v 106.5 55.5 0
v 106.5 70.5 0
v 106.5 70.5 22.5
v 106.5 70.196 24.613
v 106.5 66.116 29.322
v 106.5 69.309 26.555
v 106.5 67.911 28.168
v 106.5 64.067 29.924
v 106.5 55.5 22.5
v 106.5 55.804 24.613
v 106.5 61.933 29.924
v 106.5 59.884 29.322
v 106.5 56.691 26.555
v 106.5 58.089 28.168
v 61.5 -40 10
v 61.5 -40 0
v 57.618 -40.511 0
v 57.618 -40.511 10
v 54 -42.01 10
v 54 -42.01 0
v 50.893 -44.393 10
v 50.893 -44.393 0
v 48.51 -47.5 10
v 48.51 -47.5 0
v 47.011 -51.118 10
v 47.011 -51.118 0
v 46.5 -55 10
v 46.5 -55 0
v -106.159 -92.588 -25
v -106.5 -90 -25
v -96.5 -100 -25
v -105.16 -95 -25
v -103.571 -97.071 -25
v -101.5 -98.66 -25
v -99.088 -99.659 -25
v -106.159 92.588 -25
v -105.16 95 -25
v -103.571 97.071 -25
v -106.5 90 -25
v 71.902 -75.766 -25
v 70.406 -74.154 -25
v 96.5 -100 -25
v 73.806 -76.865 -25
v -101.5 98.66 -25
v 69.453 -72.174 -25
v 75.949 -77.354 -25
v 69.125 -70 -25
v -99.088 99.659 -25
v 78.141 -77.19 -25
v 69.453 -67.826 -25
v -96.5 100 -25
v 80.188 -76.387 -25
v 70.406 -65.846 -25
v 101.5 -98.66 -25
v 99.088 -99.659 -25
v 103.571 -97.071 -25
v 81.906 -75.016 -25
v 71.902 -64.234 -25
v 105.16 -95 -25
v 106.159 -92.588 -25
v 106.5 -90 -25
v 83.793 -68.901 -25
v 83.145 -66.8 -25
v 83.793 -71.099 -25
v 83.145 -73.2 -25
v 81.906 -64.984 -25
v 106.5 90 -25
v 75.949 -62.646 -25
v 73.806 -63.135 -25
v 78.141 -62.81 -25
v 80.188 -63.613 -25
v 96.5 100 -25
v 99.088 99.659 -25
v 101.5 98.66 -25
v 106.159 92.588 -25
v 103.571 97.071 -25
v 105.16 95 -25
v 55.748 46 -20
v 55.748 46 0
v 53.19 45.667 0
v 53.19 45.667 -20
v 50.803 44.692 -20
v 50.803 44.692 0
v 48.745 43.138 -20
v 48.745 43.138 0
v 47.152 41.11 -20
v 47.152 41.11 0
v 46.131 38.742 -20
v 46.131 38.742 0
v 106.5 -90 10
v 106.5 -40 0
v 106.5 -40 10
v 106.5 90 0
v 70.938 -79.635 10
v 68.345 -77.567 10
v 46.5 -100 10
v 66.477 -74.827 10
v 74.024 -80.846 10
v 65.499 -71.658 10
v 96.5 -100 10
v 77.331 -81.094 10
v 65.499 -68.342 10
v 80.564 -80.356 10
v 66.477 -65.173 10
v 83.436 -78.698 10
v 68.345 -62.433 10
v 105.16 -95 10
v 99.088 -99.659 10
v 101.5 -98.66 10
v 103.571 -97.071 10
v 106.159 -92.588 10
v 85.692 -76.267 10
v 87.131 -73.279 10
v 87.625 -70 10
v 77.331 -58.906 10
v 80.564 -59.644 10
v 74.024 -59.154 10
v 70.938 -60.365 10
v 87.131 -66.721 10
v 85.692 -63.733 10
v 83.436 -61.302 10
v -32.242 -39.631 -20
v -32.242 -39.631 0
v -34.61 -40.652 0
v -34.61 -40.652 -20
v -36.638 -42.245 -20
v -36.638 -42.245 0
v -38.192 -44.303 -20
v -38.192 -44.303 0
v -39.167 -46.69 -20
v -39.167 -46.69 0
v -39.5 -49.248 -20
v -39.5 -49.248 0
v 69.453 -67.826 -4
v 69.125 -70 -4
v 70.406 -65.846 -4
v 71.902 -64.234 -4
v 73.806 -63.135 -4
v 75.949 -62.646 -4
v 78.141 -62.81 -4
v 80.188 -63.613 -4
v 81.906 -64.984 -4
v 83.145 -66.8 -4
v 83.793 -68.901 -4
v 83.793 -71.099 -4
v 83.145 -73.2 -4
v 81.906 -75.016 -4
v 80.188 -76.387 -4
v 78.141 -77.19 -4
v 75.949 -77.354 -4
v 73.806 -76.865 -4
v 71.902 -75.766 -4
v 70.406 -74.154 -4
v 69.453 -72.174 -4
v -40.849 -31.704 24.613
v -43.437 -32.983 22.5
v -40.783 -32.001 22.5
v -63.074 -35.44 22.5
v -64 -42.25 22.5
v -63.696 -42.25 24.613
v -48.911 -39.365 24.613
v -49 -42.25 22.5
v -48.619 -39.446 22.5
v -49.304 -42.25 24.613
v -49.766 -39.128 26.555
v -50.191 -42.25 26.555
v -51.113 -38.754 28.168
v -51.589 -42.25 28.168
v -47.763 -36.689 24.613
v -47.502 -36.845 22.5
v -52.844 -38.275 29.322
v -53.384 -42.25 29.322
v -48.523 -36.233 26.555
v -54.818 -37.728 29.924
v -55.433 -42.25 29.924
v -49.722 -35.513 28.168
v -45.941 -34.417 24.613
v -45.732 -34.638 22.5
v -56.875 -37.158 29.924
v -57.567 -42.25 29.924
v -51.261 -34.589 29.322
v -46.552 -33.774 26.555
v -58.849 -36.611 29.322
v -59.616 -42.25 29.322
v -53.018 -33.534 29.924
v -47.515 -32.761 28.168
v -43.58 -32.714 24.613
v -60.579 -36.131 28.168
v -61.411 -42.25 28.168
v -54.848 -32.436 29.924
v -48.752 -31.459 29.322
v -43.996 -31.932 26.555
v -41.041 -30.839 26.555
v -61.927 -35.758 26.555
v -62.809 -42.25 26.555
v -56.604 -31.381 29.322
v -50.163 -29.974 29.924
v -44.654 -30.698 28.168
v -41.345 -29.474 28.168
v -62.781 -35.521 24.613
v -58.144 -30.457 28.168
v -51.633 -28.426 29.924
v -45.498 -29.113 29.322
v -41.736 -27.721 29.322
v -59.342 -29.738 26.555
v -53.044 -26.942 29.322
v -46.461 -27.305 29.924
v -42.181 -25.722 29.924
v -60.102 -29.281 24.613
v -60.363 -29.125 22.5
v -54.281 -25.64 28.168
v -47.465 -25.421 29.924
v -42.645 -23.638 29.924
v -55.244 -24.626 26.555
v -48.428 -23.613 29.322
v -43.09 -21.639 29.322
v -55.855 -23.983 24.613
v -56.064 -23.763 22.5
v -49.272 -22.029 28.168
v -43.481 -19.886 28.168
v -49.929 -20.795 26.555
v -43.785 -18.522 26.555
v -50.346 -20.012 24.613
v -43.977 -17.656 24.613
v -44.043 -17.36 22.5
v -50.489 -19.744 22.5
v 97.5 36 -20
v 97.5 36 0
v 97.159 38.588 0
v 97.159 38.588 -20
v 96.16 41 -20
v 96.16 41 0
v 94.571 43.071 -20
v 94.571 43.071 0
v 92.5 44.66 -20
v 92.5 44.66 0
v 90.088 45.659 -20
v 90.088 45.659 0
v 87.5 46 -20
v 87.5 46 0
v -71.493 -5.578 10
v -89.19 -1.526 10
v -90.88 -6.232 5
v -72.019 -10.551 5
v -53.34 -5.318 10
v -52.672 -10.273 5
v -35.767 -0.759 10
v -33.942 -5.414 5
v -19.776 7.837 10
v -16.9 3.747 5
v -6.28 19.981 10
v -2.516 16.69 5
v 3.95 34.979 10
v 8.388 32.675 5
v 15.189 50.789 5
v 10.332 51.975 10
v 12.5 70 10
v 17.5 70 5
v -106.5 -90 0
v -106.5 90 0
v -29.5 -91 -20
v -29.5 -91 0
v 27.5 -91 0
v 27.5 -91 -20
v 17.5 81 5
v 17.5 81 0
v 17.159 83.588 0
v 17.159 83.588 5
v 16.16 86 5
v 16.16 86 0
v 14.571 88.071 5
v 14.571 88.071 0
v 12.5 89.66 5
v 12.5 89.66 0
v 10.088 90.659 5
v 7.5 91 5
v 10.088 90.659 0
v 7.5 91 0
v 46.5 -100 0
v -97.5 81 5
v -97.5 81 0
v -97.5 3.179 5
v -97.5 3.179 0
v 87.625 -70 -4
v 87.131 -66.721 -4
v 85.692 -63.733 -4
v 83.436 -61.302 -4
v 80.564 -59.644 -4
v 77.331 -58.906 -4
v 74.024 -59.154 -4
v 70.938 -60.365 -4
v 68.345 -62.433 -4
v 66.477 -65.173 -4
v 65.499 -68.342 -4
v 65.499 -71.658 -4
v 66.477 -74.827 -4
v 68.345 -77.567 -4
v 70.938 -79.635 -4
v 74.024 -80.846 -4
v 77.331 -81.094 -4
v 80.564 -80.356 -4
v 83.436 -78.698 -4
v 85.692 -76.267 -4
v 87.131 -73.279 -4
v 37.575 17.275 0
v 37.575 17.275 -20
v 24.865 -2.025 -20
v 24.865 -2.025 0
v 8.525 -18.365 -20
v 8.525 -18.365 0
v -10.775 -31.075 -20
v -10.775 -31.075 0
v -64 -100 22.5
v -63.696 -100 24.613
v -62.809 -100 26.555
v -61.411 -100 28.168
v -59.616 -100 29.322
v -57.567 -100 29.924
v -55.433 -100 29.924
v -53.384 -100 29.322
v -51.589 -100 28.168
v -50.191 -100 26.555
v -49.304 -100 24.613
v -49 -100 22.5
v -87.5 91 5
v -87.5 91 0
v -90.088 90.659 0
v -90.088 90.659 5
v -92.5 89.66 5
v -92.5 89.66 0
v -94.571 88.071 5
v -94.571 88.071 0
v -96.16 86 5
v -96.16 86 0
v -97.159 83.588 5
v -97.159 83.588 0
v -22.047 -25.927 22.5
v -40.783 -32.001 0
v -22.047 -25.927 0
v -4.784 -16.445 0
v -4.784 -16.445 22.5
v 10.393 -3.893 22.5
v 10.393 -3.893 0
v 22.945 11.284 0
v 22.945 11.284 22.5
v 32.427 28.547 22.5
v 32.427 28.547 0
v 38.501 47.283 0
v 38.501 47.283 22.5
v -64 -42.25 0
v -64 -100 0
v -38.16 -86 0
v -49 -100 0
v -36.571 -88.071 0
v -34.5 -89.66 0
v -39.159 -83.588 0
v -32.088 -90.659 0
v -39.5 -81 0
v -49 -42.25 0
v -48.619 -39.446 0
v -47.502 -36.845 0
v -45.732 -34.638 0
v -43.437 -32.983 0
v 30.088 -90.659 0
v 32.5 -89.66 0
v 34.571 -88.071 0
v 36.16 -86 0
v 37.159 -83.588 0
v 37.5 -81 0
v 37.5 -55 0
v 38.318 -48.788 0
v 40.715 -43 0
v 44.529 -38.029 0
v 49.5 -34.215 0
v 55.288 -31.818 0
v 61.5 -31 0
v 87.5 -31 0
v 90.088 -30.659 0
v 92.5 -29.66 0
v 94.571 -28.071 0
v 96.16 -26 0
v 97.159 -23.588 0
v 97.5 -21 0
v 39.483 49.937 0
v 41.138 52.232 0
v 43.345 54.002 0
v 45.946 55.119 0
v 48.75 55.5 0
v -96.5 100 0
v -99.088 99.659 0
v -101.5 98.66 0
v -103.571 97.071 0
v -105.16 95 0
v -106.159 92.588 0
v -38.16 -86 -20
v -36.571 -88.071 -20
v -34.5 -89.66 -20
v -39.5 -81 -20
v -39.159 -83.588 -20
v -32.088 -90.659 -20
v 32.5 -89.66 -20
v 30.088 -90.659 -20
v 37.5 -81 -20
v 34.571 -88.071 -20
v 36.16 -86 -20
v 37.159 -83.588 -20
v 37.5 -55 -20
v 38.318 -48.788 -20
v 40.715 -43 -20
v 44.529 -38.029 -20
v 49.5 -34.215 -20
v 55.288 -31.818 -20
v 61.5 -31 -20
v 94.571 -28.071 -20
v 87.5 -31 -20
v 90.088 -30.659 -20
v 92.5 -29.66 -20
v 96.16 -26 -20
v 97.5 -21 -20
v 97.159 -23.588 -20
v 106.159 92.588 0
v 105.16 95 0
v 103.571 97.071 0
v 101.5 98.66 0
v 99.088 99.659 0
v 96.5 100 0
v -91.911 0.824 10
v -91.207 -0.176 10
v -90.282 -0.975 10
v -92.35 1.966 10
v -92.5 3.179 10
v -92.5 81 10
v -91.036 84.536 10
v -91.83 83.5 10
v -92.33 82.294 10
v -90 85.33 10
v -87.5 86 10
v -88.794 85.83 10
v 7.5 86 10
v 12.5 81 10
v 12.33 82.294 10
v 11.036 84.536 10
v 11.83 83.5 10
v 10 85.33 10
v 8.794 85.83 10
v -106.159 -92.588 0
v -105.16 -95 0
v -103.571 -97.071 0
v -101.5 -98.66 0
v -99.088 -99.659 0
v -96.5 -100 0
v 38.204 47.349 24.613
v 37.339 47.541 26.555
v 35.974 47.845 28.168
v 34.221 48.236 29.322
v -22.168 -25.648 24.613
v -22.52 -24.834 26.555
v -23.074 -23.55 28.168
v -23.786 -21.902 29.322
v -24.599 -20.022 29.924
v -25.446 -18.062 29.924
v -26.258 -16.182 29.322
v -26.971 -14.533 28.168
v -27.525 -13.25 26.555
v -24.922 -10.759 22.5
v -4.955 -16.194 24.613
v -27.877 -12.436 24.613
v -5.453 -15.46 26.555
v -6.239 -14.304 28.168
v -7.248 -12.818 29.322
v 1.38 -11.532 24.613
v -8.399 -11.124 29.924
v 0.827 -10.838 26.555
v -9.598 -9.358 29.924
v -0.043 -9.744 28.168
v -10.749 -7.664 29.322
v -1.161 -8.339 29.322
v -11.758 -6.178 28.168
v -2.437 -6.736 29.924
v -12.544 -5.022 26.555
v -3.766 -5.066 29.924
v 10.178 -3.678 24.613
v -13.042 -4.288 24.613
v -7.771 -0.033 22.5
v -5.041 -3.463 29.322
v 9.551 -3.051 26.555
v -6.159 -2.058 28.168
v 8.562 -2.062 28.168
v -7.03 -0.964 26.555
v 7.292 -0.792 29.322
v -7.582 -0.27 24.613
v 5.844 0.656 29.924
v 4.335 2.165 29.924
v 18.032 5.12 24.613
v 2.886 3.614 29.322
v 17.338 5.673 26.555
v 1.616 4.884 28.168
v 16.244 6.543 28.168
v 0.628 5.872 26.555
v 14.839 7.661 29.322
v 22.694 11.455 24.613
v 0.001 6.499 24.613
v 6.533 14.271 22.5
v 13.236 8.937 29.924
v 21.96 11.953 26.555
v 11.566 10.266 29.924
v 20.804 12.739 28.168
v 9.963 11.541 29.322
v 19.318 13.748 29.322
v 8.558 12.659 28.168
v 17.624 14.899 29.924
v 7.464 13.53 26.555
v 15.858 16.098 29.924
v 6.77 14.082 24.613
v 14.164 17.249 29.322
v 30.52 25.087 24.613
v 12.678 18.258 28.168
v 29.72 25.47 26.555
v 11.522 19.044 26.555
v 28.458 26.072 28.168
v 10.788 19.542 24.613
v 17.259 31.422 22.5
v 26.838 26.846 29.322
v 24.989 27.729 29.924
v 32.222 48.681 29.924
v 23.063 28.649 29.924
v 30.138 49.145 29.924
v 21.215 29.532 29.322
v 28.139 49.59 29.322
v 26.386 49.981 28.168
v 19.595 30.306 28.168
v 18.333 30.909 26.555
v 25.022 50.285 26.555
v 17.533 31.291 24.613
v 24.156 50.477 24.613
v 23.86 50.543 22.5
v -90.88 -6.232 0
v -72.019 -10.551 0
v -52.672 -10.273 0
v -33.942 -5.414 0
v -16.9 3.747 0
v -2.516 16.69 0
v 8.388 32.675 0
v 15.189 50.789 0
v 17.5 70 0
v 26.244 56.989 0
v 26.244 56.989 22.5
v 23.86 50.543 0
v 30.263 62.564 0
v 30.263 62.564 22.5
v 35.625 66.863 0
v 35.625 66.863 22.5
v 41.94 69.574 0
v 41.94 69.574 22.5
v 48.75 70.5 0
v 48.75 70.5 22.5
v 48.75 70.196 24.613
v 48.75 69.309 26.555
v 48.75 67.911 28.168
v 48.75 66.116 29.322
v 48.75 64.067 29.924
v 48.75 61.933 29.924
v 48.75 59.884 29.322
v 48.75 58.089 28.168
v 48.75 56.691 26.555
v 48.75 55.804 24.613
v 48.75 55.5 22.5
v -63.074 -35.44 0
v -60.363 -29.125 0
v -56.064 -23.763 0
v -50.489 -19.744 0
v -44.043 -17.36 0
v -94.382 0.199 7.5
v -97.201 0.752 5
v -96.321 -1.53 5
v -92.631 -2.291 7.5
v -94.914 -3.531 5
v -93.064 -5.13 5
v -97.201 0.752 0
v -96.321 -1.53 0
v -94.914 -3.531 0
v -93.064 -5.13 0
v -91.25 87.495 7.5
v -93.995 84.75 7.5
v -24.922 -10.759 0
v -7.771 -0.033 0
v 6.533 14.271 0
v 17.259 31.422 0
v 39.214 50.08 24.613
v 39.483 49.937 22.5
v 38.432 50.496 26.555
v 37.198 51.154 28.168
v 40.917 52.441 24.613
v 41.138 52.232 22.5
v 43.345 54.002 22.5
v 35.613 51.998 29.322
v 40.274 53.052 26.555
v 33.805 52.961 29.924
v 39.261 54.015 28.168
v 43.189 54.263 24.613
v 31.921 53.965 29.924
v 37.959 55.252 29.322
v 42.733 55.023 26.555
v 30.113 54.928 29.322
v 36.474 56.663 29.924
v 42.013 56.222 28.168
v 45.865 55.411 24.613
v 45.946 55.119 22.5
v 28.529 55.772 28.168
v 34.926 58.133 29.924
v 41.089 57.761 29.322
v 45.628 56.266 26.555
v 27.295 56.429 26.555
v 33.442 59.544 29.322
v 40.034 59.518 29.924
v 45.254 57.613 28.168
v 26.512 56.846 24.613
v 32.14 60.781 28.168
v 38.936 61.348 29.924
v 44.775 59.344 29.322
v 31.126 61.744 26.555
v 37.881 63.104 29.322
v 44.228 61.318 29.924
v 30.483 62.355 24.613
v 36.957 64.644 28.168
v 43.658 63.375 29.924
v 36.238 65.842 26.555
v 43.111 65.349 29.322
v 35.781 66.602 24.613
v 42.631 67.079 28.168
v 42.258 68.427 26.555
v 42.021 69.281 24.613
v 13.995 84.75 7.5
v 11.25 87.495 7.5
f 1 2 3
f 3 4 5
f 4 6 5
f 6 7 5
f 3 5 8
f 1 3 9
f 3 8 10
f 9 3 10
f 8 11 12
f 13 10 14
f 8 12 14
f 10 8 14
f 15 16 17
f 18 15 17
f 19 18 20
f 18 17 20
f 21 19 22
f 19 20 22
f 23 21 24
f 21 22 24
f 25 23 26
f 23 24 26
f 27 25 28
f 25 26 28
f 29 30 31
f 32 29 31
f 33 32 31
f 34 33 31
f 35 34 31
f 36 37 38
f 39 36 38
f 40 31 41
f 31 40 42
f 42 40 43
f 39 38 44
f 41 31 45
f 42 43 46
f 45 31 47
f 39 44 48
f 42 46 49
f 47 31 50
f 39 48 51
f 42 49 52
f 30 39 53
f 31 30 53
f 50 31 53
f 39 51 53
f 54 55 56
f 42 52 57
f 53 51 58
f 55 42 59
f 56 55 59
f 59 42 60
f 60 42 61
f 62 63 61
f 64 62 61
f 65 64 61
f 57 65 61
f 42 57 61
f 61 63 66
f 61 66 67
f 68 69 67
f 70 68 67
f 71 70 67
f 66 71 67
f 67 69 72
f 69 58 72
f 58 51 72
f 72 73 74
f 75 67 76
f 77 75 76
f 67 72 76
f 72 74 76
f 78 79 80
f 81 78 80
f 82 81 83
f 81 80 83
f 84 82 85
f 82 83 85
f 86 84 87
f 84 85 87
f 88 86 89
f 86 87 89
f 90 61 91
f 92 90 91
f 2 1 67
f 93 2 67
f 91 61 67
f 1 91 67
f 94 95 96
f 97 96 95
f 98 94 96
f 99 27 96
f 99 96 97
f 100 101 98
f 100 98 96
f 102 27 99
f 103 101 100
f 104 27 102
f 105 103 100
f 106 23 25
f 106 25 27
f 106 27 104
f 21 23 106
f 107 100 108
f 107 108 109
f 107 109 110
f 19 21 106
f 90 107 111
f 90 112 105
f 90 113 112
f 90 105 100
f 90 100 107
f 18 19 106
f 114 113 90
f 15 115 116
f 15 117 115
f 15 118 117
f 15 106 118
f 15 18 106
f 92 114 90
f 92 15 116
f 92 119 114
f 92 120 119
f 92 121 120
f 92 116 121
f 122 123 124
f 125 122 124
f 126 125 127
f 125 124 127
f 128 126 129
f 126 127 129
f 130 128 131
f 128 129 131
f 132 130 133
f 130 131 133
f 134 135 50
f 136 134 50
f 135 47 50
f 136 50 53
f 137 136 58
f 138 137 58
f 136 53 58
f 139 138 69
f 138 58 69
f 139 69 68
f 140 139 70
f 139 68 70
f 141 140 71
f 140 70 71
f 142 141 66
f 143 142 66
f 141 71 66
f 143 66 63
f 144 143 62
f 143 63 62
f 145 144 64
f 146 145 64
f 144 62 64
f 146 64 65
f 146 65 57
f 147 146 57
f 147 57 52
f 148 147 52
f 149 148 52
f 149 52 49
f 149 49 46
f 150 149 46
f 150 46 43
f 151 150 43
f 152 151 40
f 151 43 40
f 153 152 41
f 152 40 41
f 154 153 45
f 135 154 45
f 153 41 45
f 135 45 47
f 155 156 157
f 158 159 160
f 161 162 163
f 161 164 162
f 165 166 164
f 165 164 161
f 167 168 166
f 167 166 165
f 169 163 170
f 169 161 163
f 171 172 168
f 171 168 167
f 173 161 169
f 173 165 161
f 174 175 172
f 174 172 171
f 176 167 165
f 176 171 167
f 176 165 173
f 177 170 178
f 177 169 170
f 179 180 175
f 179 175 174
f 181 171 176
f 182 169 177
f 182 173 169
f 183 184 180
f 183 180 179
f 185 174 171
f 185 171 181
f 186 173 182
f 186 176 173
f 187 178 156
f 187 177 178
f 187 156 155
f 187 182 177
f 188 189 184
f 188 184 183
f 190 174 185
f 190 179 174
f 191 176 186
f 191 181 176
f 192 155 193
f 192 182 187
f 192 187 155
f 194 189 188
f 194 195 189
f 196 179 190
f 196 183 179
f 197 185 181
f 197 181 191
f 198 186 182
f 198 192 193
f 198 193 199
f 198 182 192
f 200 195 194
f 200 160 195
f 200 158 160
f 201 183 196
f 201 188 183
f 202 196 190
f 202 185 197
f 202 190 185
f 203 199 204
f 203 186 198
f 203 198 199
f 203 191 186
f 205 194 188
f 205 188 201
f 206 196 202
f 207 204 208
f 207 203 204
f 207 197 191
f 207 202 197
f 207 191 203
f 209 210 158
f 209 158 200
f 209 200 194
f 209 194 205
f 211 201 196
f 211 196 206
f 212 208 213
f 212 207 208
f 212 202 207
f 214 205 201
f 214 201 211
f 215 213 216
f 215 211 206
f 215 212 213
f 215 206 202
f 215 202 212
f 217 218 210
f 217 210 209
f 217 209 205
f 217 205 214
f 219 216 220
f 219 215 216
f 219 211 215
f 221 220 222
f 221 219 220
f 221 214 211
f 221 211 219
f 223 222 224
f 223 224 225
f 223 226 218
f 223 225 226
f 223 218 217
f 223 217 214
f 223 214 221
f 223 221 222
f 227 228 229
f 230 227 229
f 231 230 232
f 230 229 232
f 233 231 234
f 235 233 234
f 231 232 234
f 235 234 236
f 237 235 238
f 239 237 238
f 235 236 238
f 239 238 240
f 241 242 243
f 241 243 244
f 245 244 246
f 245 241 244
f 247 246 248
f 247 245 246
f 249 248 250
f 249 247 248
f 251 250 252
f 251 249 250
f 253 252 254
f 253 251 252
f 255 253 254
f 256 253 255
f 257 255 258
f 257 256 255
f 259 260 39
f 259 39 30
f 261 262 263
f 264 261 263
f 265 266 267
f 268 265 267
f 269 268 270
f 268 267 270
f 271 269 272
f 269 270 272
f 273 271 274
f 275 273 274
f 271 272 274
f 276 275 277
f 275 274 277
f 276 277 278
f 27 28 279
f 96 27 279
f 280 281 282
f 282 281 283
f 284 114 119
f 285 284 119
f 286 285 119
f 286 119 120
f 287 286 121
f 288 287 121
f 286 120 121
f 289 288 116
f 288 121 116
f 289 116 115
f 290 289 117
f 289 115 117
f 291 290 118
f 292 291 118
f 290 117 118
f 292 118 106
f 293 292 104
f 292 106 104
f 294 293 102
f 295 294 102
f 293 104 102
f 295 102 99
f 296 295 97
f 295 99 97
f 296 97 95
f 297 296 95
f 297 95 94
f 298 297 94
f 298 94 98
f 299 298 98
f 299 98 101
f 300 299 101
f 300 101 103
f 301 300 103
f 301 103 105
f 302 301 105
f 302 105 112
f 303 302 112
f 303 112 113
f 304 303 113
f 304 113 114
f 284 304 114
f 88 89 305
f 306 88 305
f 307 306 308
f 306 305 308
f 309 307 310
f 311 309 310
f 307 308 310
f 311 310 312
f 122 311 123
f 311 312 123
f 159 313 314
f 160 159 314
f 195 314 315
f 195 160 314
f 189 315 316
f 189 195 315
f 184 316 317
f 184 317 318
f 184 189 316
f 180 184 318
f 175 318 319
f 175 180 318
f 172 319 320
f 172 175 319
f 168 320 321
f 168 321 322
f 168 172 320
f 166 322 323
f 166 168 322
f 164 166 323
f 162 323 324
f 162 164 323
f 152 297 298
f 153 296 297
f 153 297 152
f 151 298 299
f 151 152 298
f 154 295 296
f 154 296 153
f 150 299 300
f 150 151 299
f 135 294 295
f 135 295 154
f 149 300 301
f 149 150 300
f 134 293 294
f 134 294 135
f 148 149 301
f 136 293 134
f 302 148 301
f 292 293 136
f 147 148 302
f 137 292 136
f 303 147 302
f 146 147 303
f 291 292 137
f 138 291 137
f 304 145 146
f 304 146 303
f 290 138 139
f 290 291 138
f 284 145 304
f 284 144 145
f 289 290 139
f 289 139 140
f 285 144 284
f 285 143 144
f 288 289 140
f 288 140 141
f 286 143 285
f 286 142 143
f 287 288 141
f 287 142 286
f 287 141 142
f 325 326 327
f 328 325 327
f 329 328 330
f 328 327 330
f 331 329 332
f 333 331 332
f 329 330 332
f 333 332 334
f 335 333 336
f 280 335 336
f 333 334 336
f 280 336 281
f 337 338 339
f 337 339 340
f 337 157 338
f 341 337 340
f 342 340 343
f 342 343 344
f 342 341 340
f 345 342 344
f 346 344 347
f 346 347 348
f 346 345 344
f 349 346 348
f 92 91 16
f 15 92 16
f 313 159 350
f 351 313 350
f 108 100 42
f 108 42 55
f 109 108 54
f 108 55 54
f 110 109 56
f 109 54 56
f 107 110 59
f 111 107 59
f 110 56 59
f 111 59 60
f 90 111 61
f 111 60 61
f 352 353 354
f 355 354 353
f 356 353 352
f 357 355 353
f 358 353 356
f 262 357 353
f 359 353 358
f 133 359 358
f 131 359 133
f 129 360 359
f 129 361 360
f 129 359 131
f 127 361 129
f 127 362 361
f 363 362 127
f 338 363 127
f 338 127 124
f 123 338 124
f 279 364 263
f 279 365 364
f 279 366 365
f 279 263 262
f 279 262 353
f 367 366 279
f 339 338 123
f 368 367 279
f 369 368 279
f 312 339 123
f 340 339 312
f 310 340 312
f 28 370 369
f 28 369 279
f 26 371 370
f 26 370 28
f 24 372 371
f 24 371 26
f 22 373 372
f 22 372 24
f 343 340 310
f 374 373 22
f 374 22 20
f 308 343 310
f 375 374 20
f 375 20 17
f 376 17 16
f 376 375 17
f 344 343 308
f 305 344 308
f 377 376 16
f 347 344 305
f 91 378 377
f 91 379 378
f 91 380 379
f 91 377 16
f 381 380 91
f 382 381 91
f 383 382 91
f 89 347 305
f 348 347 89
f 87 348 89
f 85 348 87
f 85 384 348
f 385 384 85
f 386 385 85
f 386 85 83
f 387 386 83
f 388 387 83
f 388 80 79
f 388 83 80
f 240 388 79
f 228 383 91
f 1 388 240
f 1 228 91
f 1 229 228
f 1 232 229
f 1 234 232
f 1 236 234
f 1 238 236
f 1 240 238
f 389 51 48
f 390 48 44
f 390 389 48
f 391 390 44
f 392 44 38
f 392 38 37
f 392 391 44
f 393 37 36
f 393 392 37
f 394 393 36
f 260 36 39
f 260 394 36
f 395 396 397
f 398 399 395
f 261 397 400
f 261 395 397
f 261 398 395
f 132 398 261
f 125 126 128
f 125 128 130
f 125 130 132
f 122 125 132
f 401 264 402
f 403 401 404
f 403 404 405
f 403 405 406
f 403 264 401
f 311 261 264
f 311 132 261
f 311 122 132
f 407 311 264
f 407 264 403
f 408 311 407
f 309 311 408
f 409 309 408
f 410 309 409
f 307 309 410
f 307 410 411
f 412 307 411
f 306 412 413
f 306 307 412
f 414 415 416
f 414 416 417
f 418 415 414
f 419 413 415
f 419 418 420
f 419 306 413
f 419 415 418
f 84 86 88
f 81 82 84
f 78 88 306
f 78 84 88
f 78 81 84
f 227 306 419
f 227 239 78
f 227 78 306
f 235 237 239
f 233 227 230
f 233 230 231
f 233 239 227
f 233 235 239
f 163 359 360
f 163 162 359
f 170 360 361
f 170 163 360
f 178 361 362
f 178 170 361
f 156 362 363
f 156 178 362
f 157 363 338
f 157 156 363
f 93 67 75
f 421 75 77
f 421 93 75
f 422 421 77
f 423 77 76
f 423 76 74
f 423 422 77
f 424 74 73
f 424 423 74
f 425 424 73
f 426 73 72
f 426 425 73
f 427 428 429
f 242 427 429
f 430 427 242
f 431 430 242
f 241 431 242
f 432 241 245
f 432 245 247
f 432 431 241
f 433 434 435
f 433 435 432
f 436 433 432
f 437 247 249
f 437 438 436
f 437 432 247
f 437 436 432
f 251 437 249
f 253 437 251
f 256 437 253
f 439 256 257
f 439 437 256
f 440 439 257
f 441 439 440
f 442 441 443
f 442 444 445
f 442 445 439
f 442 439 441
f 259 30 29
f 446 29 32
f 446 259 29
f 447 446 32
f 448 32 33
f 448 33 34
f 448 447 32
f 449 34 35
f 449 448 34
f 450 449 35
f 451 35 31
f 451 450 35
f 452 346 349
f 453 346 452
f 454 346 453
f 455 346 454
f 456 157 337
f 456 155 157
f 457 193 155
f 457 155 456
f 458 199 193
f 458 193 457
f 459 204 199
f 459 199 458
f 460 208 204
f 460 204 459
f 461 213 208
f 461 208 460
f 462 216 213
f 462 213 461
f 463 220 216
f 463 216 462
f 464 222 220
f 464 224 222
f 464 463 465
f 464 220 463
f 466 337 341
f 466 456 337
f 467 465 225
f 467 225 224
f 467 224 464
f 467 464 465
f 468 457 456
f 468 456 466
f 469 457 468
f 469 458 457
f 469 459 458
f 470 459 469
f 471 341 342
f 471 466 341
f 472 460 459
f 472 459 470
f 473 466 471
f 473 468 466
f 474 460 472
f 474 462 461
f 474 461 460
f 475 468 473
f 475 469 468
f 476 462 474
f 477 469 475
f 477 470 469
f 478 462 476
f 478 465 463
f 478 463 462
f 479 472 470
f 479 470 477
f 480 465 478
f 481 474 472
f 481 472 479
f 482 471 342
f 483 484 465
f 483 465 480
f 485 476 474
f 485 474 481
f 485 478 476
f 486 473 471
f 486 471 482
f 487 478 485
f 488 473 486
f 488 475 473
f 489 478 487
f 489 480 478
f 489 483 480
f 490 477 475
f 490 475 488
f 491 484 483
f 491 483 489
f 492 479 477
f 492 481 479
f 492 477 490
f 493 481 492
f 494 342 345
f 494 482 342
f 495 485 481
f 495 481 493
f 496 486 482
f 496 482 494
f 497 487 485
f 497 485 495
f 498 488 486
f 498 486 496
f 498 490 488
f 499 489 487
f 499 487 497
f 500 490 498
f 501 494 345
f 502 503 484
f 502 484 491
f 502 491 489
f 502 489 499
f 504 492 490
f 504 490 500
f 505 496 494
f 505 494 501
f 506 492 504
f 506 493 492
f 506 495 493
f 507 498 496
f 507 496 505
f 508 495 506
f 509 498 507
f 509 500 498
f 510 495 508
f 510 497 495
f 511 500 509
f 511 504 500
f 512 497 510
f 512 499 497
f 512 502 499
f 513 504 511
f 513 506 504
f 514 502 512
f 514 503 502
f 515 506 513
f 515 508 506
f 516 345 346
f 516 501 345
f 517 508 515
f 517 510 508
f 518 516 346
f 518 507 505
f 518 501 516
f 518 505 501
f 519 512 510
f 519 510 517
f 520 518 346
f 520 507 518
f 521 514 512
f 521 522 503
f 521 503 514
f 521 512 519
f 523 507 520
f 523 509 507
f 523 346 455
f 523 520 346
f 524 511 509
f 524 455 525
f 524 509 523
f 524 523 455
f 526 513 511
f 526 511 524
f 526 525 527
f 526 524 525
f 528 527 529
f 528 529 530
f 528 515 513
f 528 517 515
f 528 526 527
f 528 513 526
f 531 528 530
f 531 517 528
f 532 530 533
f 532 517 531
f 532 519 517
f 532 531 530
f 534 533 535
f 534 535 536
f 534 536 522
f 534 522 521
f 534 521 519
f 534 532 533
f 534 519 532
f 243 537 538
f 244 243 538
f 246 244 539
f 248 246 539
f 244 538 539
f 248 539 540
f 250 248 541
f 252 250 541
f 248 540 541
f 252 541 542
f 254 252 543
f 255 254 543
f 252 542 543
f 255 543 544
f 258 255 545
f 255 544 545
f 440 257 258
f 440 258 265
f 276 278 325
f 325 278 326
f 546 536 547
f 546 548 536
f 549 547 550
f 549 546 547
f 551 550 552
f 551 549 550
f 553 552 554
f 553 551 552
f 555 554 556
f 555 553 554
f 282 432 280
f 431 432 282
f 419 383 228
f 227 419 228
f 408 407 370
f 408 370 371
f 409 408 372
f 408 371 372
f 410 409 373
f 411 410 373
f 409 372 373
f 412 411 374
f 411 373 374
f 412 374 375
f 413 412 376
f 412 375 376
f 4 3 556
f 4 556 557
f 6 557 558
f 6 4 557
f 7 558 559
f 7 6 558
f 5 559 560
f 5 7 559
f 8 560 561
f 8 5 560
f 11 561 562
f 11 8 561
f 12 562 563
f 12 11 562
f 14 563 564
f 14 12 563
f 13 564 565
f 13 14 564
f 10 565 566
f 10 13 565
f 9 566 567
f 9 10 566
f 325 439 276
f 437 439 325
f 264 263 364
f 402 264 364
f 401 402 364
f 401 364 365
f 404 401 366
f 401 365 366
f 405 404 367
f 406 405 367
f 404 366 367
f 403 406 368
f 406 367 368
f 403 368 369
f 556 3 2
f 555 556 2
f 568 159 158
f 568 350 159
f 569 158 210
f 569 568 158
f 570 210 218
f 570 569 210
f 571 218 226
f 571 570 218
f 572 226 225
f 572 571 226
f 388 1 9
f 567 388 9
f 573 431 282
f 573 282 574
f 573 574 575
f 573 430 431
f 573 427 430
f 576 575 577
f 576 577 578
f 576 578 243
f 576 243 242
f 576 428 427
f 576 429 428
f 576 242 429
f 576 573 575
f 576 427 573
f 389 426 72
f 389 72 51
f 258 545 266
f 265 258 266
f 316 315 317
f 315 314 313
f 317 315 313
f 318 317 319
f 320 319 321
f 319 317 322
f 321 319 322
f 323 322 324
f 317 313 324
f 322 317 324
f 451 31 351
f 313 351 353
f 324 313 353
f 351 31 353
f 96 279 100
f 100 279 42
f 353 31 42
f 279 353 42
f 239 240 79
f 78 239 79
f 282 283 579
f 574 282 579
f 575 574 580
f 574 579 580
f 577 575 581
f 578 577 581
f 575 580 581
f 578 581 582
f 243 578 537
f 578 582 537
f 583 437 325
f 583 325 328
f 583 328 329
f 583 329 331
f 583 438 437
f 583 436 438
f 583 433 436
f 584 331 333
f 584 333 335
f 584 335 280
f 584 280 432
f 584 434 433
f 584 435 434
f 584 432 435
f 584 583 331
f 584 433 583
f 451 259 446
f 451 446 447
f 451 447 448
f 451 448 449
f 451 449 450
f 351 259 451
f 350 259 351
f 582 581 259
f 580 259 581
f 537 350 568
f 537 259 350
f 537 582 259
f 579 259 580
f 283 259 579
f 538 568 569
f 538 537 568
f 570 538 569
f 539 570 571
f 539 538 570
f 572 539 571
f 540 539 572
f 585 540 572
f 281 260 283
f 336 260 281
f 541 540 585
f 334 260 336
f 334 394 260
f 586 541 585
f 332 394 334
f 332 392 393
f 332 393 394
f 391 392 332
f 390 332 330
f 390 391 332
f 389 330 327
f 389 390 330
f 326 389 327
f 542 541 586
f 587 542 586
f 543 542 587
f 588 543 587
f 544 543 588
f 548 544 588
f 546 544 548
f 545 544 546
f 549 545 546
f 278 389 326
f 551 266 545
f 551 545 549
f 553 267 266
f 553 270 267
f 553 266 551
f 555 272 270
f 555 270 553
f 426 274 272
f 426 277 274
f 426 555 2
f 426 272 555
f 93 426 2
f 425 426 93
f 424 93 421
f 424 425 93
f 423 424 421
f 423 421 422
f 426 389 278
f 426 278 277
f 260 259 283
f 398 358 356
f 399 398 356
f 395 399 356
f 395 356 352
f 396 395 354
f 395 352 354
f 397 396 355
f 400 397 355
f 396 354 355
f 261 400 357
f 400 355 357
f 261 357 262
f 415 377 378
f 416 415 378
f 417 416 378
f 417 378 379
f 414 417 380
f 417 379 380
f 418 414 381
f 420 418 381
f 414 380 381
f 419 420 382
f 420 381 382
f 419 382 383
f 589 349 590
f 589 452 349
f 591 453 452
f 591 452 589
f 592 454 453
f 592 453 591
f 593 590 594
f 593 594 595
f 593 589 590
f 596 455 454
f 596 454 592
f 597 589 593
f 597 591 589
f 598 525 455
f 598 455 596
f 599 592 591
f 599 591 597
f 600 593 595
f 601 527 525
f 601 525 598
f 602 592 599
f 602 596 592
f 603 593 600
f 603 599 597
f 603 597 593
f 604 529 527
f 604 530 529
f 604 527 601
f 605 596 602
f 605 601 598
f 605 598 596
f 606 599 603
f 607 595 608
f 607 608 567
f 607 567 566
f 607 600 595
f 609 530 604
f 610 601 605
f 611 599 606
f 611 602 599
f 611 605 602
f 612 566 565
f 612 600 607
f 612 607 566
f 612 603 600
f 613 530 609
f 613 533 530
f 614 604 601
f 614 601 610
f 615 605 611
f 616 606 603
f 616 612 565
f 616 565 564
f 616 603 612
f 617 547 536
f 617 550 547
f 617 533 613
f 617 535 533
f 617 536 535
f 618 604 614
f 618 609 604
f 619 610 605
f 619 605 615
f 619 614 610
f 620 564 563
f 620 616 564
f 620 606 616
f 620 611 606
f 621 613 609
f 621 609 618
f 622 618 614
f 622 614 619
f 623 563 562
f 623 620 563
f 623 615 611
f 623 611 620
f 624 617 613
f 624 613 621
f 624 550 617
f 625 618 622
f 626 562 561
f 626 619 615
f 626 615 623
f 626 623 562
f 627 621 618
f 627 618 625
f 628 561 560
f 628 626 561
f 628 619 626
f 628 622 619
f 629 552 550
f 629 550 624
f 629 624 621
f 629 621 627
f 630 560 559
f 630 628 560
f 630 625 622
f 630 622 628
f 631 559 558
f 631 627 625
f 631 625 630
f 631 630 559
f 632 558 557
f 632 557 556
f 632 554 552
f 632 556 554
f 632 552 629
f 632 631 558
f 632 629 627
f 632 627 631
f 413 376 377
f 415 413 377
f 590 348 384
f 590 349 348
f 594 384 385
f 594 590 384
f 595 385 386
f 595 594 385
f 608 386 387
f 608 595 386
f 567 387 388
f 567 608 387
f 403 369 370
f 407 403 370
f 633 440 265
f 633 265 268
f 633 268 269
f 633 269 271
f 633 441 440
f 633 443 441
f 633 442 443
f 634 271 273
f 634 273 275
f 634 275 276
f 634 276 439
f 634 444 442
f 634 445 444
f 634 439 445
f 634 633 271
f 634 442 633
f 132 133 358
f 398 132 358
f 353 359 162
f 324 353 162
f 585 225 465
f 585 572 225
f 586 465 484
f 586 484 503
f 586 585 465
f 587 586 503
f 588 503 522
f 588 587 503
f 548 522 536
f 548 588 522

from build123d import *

# Parameters (mm, degrees)
F1_DEPTH       = 25
F2_DEPTH       = 10
F3_DEPTH       = 10
F4_DEPTH       = 20
F6_D           = 14.75
F6_CBORE_D     = 22.25
F6_CBORE_DEPTH = 14
F9_SIZE        = 5


with BuildPart() as f1:
    # F0 (on Top) → F1 (new body)
    with BuildSketch(Plane.XY):
        with BuildLine():
            Line((96.5, 100), (-96.5, 100))
            ThreePointArc((-96.5, 100), (-103.5710678119, 97.0710678119), (-106.5, 90))
            Line((-106.5, 90), (-106.5, -90))
            ThreePointArc((-106.5, -90), (-103.5710678119, -97.0710678119), (-96.5, -100))
            Line((-96.5, -100), (-63.5, -100))
            Line((-63.5, -100), (-63.5, -42.2497216032))
            ThreePointArc((-63.5, -42.2497216032), (-58.0047374401, -26.6111405489), (-43.9347826087, -17.8476082112))
            ThreePointArc((-43.9347826087, -17.8476082112), (0.1396103068, 6.3603896932), (24.3476082112, 50.4347826087))
            ThreePointArc((24.3476082112, 50.4347826087), (33.1111405489, 64.5047374401), (48.7497216032, 70))
            Line((48.7497216032, 70), (106.5, 70))
            Line((106.5, 70), (106.5, 90))
            ThreePointArc((106.5, 90), (103.5710678119, 97.0710678119), (96.5, 100))
        make_face()
        with BuildLine():
            ThreePointArc((17.5, 70), (-16.8995859294, 3.7474422497), (-90.8802816901, -6.2320154172))
            ThreePointArc((-90.8802816901, -6.2320154172), (-95.6793281173, -2.5737930287), (-97.5, 3.1793445108))
            Line((-97.5, 3.1793445108), (-97.5, 81))
            ThreePointArc((-97.5, 81), (-94.5710678119, 88.0710678119), (-87.5, 91))
            Line((-87.5, 91), (7.5, 91))
            ThreePointArc((7.5, 91), (14.5710678119, 88.0710678119), (17.5, 81))
            Line((17.5, 81), (17.5, 70))
        make_face(mode=Mode.SUBTRACT)
        with BuildLine():
            Line((106.5, 55), (106.5, 70))
            Line((106.5, 70), (48.7497216032, 70))
            ThreePointArc((48.7497216032, 70), (33.1111405489, 64.5047374401), (24.3476082112, 50.4347826087))
            ThreePointArc((24.3476082112, 50.4347826087), (0.1396103068, 6.3603896932), (-43.9347826087, -17.8476082112))
            ThreePointArc((-43.9347826087, -17.8476082112), (-58.0047374401, -26.6111405489), (-63.5, -42.2497216032))
            Line((-63.5, -42.2497216032), (-63.5, -100))
            Line((-63.5, -100), (-48.5, -100))
            Line((-48.5, -100), (-48.5, -42.2497216032))
            ThreePointArc((-48.5, -42.2497216032), (-46.3018949761, -35.9942891815), (-40.6739130435, -32.4888762464))
            ThreePointArc((-40.6739130435, -32.4888762464), (10.7462120246, -4.2462120246), (38.9888762464, 47.1739130435))
            ThreePointArc((38.9888762464, 47.1739130435), (42.4942891815, 52.8018949761), (48.7497216032, 55))
            Line((48.7497216032, 55), (106.5, 55))
        make_face()
        with BuildLine():
            Line((106.5, -40), (106.5, 55))
            Line((106.5, 55), (48.7497216032, 55))
            ThreePointArc((48.7497216032, 55), (42.4942891815, 52.8018949761), (38.9888762464, 47.1739130435))
            ThreePointArc((38.9888762464, 47.1739130435), (10.7462120246, -4.2462120246), (-40.6739130435, -32.4888762464))
            ThreePointArc((-40.6739130435, -32.4888762464), (-46.3018949761, -35.9942891815), (-48.5, -42.2497216032))
            Line((-48.5, -42.2497216032), (-48.5, -100))
            Line((-48.5, -100), (46.5, -100))
            Line((46.5, -100), (46.5, -55))
            ThreePointArc((46.5, -55), (50.8933982822, -44.3933982822), (61.5, -40))
            Line((61.5, -40), (106.5, -40))
        make_face()
        with BuildLine():
            Line((87.5, -31), (61.5, -31))
            ThreePointArc((61.5, -31), (44.5294372515, -38.0294372515), (37.5, -55))
            Line((37.5, -55), (37.5, -81))
            ThreePointArc((37.5, -81), (34.5710678119, -88.0710678119), (27.5, -91))
            Line((27.5, -91), (-29.5, -91))
            ThreePointArc((-29.5, -91), (-36.5710678119, -88.0710678119), (-39.5, -81))
            Line((-39.5, -81), (-39.5, -49.2476414861))
            ThreePointArc((-39.5, -49.2476414861), (-37.481834214, -43.2234965193), (-32.2419354839, -39.630896205))
            ThreePointArc((-32.2419354839, -39.630896205), (17.1101730553, -10.6101730553), (46.130896205, 38.7419354839))
            ThreePointArc((46.130896205, 38.7419354839), (49.7234965193, 43.981834214), (55.7476414861, 46))
            Line((55.7476414861, 46), (87.5, 46))
            ThreePointArc((87.5, 46), (94.5710678119, 43.0710678119), (97.5, 36))
            Line((97.5, 36), (97.5, -21))
            ThreePointArc((97.5, -21), (94.5710678119, -28.0710678119), (87.5, -31))
        make_face(mode=Mode.SUBTRACT)
        with BuildLine():
            Line((106.5, -90), (106.5, -40))
            Line((106.5, -40), (61.5, -40))
            ThreePointArc((61.5, -40), (50.8933982822, -44.3933982822), (46.5, -55))
            Line((46.5, -55), (46.5, -100))
            Line((46.5, -100), (96.5, -100))
            ThreePointArc((96.5, -100), (103.5710678119, -97.0710678119), (106.5, -90))
        make_face()
        with BuildLine():
            ThreePointArc((-97.5, 3.1793445108), (-95.6793281173, -2.5737930287), (-90.8802816901, -6.2320154172))
            ThreePointArc((-90.8802816901, -6.2320154172), (-16.8995859294, 3.7474422497), (17.5, 70))
            Line((17.5, 70), (17.5, 81))
            ThreePointArc((17.5, 81), (14.5710678119, 88.0710678119), (7.5, 91))
            Line((7.5, 91), (-87.5, 91))
            ThreePointArc((-87.5, 91), (-94.5710678119, 88.0710678119), (-97.5, 81))
            Line((-97.5, 81), (-97.5, 3.1793445108))
        make_face()
        with BuildLine():
            ThreePointArc((37.5, -55), (44.5294372515, -38.0294372515), (61.5, -31))
            Line((61.5, -31), (87.5, -31))
            ThreePointArc((87.5, -31), (94.5710678119, -28.0710678119), (97.5, -21))
            Line((97.5, -21), (97.5, 36))
            ThreePointArc((97.5, 36), (94.5710678119, 43.0710678119), (87.5, 46))
            Line((87.5, 46), (55.7476414861, 46))
            ThreePointArc((55.7476414861, 46), (49.7234965193, 43.981834214), (46.130896205, 38.7419354839))
            ThreePointArc((46.130896205, 38.7419354839), (17.1101730553, -10.6101730553), (-32.2419354839, -39.630896205))
            ThreePointArc((-32.2419354839, -39.630896205), (-37.481834214, -43.2234965193), (-39.5, -49.2476414861))
            Line((-39.5, -49.2476414861), (-39.5, -81))
            ThreePointArc((-39.5, -81), (-36.5710678119, -88.0710678119), (-29.5, -91))
            Line((-29.5, -91), (27.5, -91))
            ThreePointArc((27.5, -91), (34.5710678119, -88.0710678119), (37.5, -81))
            Line((37.5, -81), (37.5, -55))
        make_face()
    extrude(amount=-F1_DEPTH)

    # F0 (on Top) → F2 (join)
    with BuildSketch(Plane.XY):
        with BuildLine():
            Line((106.5, -90), (106.5, -40))
            Line((106.5, -40), (61.5, -40))
            ThreePointArc((61.5, -40), (50.8933982822, -44.3933982822), (46.5, -55))
            Line((46.5, -55), (46.5, -100))
            Line((46.5, -100), (96.5, -100))
            ThreePointArc((96.5, -100), (103.5710678119, -97.0710678119), (106.5, -90))
        make_face()
    extrude(amount=F2_DEPTH)

    # F0 (on Top) → F3 (join)
    with BuildSketch(Plane.XY):
        with BuildLine():
            ThreePointArc((-97.5, 3.1793445108), (-95.6793281173, -2.5737930287), (-90.8802816901, -6.2320154172))
            ThreePointArc((-90.8802816901, -6.2320154172), (-16.8995859294, 3.7474422497), (17.5, 70))
            Line((17.5, 70), (17.5, 81))
            ThreePointArc((17.5, 81), (14.5710678119, 88.0710678119), (7.5, 91))
            Line((7.5, 91), (-87.5, 91))
            ThreePointArc((-87.5, 91), (-94.5710678119, 88.0710678119), (-97.5, 81))
            Line((-97.5, 81), (-97.5, 3.1793445108))
        make_face()
    extrude(amount=F3_DEPTH)

    # F0 (on Top) → F4 (cut)
    with BuildSketch(Plane.XY):
        with BuildLine():
            ThreePointArc((37.5, -55), (44.5294372515, -38.0294372515), (61.5, -31))
            Line((61.5, -31), (87.5, -31))
            ThreePointArc((87.5, -31), (94.5710678119, -28.0710678119), (97.5, -21))
            Line((97.5, -21), (97.5, 36))
            ThreePointArc((97.5, 36), (94.5710678119, 43.0710678119), (87.5, 46))
            Line((87.5, 46), (55.7476414861, 46))
            ThreePointArc((55.7476414861, 46), (49.7234965193, 43.981834214), (46.130896205, 38.7419354839))
            ThreePointArc((46.130896205, 38.7419354839), (17.1101730553, -10.6101730553), (-32.2419354839, -39.630896205))
            ThreePointArc((-32.2419354839, -39.630896205), (-37.481834214, -43.2234965193), (-39.5, -49.2476414861))
            Line((-39.5, -49.2476414861), (-39.5, -81))
            ThreePointArc((-39.5, -81), (-36.5710678119, -88.0710678119), (-29.5, -91))
            Line((-29.5, -91), (27.5, -91))
            ThreePointArc((27.5, -91), (34.5710678119, -88.0710678119), (37.5, -81))
            Line((37.5, -81), (37.5, -55))
        make_face()
    extrude(amount=-F4_DEPTH, mode=Mode.SUBTRACT)

    # F6 (through all)
    with Locations(Plane.XY.offset(10)):
        with Locations((76.5, -70)):
            CounterBoreHole(F6_D / 2, F6_CBORE_D / 2, F6_CBORE_DEPTH)

    # F8: sweep along a path in F0
    with BuildLine(Plane.XY) as f8_path:
        Line((-48.5, -100), (-48.5, -42.2497216032))
        ThreePointArc((-48.5, -42.2497216032), (-46.3018949761, -35.9942891815), (-40.6739130435, -32.4888762464))
        ThreePointArc((-40.6739130435, -32.4888762464), (10.7462120246, -4.2462120246), (38.9888762464, 47.1739130435))
        ThreePointArc((38.9888762464, 47.1739130435), (42.4942891815, 52.8018949761), (48.7497216032, 55))
        Line((48.7497216032, 55), (106.5, 55))
    # F7 (on face) → F8 (sweep)
    with BuildSketch(Plane.XZ.offset(100)):
        with BuildLine():
            Line((-64, 0), (-49, 0))
            Line((-49, 0), (-49, 22.5))
            ThreePointArc((-49, 22.5), (-56.5, 30), (-64, 22.5))
            Line((-64, 22.5), (-64, 0))
        make_face()
    sweep(path=f8_path.line)

    # F9
    f9_edges = [f1.edges().sort_by_distance(p)[0] for p in [
        (-97.5, 42.089672, 10),
    ]]
    chamfer(f9_edges, length=F9_SIZE)


solid = f1.part
